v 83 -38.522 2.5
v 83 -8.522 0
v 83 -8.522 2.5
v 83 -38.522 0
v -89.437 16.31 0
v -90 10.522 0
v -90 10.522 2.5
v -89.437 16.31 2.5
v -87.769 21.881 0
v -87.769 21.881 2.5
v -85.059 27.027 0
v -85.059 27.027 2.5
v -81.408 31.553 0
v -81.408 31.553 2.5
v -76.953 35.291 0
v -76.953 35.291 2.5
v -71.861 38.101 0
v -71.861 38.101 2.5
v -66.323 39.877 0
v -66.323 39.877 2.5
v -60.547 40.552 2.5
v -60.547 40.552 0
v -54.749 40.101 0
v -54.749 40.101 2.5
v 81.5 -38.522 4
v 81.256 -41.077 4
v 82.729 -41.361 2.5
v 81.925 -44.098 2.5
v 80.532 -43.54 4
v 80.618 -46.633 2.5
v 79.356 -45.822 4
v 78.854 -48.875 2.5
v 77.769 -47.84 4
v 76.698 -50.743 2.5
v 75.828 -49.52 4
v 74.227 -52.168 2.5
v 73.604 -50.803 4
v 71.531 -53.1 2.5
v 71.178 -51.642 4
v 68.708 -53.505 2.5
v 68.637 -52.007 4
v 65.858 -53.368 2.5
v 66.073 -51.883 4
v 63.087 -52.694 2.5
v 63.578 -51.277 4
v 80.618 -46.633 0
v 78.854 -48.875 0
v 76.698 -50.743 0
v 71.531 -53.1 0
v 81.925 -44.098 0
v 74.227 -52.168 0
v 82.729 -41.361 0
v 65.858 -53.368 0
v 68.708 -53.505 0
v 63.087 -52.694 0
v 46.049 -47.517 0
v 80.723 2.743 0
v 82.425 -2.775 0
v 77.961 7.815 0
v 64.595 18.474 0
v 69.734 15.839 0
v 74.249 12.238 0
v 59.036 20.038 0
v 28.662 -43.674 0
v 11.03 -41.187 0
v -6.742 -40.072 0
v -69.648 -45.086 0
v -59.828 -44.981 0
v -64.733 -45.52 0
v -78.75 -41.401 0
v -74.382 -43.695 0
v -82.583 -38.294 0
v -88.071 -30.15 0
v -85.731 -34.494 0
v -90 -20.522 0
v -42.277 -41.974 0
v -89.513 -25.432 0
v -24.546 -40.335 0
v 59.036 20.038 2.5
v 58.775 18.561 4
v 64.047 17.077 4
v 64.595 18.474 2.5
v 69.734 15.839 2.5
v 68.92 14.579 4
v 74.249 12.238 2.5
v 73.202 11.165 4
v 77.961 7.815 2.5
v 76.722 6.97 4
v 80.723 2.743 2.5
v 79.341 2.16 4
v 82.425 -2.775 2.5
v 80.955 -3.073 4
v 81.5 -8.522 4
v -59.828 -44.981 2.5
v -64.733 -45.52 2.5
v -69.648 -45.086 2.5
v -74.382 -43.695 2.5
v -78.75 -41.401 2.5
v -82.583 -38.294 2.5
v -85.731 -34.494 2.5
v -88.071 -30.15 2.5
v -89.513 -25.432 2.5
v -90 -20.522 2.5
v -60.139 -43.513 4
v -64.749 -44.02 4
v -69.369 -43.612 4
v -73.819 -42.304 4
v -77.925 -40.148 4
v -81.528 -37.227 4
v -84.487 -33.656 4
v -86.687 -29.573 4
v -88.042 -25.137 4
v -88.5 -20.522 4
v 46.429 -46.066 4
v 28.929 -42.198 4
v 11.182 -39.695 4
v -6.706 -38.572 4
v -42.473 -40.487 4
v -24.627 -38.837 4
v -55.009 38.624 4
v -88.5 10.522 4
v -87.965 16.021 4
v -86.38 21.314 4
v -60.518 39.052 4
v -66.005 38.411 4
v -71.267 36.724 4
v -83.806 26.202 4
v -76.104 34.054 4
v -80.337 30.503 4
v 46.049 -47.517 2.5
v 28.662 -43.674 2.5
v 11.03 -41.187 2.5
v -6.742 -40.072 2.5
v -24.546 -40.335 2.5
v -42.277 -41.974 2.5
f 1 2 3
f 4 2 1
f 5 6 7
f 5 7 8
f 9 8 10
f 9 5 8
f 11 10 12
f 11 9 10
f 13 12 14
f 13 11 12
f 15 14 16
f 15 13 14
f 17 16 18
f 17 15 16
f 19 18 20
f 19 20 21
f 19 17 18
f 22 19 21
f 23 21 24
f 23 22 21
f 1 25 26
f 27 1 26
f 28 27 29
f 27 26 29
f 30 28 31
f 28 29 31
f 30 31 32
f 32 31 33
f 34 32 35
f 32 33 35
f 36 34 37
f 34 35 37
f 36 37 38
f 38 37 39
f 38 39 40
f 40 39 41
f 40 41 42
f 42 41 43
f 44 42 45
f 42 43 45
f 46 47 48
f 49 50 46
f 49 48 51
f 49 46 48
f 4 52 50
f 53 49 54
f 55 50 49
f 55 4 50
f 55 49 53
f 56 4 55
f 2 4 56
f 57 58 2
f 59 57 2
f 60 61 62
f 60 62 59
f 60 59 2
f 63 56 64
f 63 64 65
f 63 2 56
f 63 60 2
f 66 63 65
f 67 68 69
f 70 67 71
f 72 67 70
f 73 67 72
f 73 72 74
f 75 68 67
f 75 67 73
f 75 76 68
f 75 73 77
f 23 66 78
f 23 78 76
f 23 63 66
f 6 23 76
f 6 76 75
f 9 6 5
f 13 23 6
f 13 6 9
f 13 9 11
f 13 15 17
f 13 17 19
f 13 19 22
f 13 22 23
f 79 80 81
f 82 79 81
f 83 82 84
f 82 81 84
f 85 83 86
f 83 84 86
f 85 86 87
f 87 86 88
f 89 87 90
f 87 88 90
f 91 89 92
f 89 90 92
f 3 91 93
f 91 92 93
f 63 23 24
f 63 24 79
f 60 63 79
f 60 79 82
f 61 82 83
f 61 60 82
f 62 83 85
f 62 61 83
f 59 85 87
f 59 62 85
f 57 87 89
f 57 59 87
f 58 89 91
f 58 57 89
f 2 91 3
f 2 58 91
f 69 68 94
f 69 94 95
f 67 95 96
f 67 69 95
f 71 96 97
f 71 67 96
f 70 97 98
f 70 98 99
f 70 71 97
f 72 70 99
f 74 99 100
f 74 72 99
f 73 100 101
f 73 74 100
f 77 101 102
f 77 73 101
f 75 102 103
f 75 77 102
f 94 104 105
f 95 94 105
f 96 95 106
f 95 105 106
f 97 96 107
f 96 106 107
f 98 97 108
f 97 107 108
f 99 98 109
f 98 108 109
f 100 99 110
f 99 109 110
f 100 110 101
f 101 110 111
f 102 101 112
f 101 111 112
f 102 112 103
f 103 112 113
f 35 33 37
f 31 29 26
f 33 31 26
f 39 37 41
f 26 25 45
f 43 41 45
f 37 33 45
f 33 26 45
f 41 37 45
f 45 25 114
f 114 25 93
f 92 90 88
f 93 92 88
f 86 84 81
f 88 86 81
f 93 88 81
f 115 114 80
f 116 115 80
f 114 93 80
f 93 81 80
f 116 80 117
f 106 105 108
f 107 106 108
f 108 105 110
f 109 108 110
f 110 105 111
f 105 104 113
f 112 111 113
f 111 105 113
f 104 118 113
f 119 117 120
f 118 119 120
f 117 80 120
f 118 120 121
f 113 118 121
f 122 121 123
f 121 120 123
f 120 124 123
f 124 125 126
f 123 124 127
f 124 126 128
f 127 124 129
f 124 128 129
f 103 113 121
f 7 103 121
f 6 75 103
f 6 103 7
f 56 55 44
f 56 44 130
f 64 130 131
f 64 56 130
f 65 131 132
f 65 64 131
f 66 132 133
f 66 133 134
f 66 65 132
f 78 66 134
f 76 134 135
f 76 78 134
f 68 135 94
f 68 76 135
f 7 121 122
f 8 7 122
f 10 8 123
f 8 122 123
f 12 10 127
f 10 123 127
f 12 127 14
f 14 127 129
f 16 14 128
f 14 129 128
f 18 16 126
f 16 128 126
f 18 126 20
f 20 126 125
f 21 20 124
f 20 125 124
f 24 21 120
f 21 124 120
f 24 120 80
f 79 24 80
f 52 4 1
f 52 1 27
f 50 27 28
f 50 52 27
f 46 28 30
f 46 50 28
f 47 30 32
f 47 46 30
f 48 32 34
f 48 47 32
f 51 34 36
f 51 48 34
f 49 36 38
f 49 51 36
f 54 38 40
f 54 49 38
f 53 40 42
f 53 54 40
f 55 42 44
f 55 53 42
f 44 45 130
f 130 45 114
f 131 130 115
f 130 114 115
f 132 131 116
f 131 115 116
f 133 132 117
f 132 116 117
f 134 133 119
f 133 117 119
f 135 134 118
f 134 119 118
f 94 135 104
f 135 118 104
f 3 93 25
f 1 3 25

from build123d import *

# Parameters (mm, degrees)
BOSS_EXTRUDE1_DEPTH = 4
CHAMFER1_SIZE       = 1.5


with BuildPart() as part:
    # Sketch1 → Boss-Extrude1 (new body)
    with BuildSketch(Plane.XY):
        with BuildLine():
            Line((-54.748665604, 40.101038648), (59.035797152, 20.037767879))
            ThreePointArc((59.035797152, 20.037767879), (76.21528885, 10.119183723), (83, -8.521656958))
            Line((83, -8.521656958), (83, -38.521656958))
            ThreePointArc((83, -38.521656958), (76.697736677, -50.742515222), (63.086749774, -52.694164578))
            ThreePointArc((63.086749774, -52.694164578), (2.15504295, -40.457474253), (-59.828407224, -44.980901185))
            ThreePointArc((-59.828407224, -44.980901185), (-80.743414188, -39.941876053), (-90, -20.521656958))
            Line((-90, -20.521656958), (-90, 10.521656958))
            ThreePointArc((-90, 10.521656958), (-79.270878905, 33.530331398), (-54.748665604, 40.101038648))
        make_face()
    extrude(amount=BOSS_EXTRUDE1_DEPTH)

    # Chamfer1
    chamfer1_edges = [part.edges().sort_by_distance(p)[0] for p in [
        (-80.743414188, -39.941876053, 4),
        (2.15504295, -40.457474253, 4),
        (76.697736677, -50.742515222, 4),
        (83, -23.521656958, 4),
        (76.21528885, 10.119183723, 4),
        (2.143565774, 30.069403264, 4),
        (-79.270878905, 33.530331398, 4),
        (-90, -5, 4),
    ]]
    chamfer(chamfer1_edges, length=CHAMFER1_SIZE)


solid = part.part
